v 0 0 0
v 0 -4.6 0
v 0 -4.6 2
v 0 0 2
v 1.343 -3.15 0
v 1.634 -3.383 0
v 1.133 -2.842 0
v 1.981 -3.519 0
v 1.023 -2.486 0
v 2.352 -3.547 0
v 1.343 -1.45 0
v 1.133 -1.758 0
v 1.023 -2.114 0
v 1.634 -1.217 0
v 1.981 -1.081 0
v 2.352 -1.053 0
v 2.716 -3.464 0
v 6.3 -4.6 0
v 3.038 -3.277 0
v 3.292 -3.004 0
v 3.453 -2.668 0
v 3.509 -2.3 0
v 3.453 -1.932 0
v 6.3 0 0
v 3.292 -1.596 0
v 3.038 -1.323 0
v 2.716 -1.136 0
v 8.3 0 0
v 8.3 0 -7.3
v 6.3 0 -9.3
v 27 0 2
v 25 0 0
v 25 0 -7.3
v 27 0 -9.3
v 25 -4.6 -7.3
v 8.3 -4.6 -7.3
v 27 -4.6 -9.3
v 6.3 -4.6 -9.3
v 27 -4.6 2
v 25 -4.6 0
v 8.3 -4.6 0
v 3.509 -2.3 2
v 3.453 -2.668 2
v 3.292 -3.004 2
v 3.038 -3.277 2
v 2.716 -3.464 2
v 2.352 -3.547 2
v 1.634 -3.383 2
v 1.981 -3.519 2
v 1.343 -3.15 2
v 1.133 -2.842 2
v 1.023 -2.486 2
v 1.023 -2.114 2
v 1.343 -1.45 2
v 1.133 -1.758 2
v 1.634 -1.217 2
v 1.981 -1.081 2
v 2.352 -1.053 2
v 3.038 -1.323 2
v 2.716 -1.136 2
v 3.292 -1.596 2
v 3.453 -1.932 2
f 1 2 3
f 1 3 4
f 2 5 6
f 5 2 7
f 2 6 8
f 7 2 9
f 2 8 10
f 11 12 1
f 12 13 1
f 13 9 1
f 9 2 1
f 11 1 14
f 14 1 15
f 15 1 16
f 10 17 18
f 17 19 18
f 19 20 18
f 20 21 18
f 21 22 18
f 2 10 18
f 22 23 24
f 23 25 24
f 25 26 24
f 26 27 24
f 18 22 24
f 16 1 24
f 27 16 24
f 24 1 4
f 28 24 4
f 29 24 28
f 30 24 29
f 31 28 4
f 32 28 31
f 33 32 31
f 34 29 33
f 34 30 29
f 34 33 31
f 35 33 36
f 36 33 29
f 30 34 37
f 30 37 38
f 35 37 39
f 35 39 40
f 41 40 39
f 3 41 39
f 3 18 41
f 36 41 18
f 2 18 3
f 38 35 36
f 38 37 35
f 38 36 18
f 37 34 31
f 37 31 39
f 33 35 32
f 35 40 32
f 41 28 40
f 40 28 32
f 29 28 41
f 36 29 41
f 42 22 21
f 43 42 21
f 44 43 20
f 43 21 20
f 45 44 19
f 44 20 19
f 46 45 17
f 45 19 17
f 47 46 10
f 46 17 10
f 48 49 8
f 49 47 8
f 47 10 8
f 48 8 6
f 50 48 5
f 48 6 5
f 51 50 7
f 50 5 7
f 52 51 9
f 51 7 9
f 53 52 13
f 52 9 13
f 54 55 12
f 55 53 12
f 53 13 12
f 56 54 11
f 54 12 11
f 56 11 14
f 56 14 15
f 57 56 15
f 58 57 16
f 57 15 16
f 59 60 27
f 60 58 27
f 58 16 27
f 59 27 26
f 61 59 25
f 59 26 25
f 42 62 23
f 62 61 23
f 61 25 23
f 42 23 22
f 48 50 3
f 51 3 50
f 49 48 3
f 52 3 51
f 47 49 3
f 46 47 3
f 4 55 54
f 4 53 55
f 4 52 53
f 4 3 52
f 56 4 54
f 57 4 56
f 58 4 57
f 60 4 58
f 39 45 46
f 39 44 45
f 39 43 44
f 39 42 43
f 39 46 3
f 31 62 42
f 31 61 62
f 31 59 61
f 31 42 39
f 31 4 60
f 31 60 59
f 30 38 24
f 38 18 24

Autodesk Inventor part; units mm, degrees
ref_plane "YZ Plane" through (0, 0, 0) normal (1, 0, 0) x (0, 1, 0)
ref_plane "XZ Plane" through (0, 0, 0) normal (0, 1, 0) x (-1, 0, 0)
ref_plane "XY Plane" through (0, 0, 0) normal (0, 0, 1) x (1, 0, 0)
sketch "Sketch1" plane through (0, 0, 0) normal (0, 0, 1) x (1, 0, 0)
  line L0 (0, 0) -> (27, 0)
  line L1 (27, 0) -> (27, -4.6)
  line L2 (27, -4.6) -> (0, -4.6)
  line L3 (0, -4.6) -> (0, 0)
  circle A0 centre (2.2589, -2.3) radius 1.25
  dimension "d0" = 2.3
  dimension "d1" = 2.3
  dimension "d2" = 27
  dimension "d12" = 2.5
extrude "Extrusion1" add sketch "Sketch1" along normal blind 2
sketch "Sketch2" plane through (0, 0, 0) normal (0, 0, -1) x (-1, 0, 0)
  line L0 (0, -4.6) -> (-27, -4.6) projected
  line L1 (-6.3, 0) -> (-8.3, 0)
  line L2 (-8.3, 0) -> (-8.3, -4.6)
  line L3 (-8.3, -4.6) -> (-6.3, -4.6)
  line L4 (-6.3, -4.6) -> (-6.3, 0)
  line L5 (-27, 0) -> (0, 0) projected
  line L6 (-27, -4.6) -> (-25, -4.6)
  line L7 (-25, -4.6) -> (-25, 0)
  line L8 (-25, 0) -> (-27, 0)
  line L9 (-27, 0) -> (-27, -4.6)
  dimension "d5" = 2
  dimension "d6" = 2
  dimension "d7" = 16.7
extrude "Extrusion2" add sketch "Sketch2" along normal blind 7.3 contours L0 L2 L1 L4 | L0 L9 L5 L7
sketch "Sketch3" plane through (0, 0, -7.3) normal (0, 0, -1) x (-1, 0, 0)
  line L0 (-6.3, 0) -> (-8.3, 0) projected
  line L1 (-8.3, 0) -> (-8.3, -4.6) projected
  line L2 (-8.3, -4.6) -> (-6.3, -4.6) projected
  line L3 (-6.3, -4.6) -> (-6.3, 0) projected
  line L4 (-27, -4.6) -> (-25, -4.6) projected
  line L5 (-25, -4.6) -> (-25, 0) projected
  line L6 (-25, 0) -> (-27, 0) projected
  line L7 (-27, 0) -> (-27, -4.6) projected
  line L8 (-8.3, 0) -> (-25, 0)
  line L9 (-25, 0) -> (-25, -4.6)
  line L10 (-25, -4.6) -> (-8.3, -4.6)
  line L11 (-8.3, -4.6) -> (-8.3, 0)
  point P0 (0, 0)
extrude "Extrusion3" add sketch "Sketch3" along normal blind 2
equation "\"BendRadius\" = Thickness"
equation "\"BendReliefWidth\" = Thickness"
equation "\"BendReliefDepth\" = 0.5 * Thickness"
equation "\"CornerReliefSize\" = 4 * Thickness"
equation "\"MinimumRemnant\" = 2 * Thickness"
equation "\"TransitionRadius\" = BendRadius"
equation "\"JacobiRadiusSize\" = BendRadius"
equation "\"GapSize\" = Thickness"
equation "\"Thickness\" = 0.5"
properties part number "Switch_Holder"
